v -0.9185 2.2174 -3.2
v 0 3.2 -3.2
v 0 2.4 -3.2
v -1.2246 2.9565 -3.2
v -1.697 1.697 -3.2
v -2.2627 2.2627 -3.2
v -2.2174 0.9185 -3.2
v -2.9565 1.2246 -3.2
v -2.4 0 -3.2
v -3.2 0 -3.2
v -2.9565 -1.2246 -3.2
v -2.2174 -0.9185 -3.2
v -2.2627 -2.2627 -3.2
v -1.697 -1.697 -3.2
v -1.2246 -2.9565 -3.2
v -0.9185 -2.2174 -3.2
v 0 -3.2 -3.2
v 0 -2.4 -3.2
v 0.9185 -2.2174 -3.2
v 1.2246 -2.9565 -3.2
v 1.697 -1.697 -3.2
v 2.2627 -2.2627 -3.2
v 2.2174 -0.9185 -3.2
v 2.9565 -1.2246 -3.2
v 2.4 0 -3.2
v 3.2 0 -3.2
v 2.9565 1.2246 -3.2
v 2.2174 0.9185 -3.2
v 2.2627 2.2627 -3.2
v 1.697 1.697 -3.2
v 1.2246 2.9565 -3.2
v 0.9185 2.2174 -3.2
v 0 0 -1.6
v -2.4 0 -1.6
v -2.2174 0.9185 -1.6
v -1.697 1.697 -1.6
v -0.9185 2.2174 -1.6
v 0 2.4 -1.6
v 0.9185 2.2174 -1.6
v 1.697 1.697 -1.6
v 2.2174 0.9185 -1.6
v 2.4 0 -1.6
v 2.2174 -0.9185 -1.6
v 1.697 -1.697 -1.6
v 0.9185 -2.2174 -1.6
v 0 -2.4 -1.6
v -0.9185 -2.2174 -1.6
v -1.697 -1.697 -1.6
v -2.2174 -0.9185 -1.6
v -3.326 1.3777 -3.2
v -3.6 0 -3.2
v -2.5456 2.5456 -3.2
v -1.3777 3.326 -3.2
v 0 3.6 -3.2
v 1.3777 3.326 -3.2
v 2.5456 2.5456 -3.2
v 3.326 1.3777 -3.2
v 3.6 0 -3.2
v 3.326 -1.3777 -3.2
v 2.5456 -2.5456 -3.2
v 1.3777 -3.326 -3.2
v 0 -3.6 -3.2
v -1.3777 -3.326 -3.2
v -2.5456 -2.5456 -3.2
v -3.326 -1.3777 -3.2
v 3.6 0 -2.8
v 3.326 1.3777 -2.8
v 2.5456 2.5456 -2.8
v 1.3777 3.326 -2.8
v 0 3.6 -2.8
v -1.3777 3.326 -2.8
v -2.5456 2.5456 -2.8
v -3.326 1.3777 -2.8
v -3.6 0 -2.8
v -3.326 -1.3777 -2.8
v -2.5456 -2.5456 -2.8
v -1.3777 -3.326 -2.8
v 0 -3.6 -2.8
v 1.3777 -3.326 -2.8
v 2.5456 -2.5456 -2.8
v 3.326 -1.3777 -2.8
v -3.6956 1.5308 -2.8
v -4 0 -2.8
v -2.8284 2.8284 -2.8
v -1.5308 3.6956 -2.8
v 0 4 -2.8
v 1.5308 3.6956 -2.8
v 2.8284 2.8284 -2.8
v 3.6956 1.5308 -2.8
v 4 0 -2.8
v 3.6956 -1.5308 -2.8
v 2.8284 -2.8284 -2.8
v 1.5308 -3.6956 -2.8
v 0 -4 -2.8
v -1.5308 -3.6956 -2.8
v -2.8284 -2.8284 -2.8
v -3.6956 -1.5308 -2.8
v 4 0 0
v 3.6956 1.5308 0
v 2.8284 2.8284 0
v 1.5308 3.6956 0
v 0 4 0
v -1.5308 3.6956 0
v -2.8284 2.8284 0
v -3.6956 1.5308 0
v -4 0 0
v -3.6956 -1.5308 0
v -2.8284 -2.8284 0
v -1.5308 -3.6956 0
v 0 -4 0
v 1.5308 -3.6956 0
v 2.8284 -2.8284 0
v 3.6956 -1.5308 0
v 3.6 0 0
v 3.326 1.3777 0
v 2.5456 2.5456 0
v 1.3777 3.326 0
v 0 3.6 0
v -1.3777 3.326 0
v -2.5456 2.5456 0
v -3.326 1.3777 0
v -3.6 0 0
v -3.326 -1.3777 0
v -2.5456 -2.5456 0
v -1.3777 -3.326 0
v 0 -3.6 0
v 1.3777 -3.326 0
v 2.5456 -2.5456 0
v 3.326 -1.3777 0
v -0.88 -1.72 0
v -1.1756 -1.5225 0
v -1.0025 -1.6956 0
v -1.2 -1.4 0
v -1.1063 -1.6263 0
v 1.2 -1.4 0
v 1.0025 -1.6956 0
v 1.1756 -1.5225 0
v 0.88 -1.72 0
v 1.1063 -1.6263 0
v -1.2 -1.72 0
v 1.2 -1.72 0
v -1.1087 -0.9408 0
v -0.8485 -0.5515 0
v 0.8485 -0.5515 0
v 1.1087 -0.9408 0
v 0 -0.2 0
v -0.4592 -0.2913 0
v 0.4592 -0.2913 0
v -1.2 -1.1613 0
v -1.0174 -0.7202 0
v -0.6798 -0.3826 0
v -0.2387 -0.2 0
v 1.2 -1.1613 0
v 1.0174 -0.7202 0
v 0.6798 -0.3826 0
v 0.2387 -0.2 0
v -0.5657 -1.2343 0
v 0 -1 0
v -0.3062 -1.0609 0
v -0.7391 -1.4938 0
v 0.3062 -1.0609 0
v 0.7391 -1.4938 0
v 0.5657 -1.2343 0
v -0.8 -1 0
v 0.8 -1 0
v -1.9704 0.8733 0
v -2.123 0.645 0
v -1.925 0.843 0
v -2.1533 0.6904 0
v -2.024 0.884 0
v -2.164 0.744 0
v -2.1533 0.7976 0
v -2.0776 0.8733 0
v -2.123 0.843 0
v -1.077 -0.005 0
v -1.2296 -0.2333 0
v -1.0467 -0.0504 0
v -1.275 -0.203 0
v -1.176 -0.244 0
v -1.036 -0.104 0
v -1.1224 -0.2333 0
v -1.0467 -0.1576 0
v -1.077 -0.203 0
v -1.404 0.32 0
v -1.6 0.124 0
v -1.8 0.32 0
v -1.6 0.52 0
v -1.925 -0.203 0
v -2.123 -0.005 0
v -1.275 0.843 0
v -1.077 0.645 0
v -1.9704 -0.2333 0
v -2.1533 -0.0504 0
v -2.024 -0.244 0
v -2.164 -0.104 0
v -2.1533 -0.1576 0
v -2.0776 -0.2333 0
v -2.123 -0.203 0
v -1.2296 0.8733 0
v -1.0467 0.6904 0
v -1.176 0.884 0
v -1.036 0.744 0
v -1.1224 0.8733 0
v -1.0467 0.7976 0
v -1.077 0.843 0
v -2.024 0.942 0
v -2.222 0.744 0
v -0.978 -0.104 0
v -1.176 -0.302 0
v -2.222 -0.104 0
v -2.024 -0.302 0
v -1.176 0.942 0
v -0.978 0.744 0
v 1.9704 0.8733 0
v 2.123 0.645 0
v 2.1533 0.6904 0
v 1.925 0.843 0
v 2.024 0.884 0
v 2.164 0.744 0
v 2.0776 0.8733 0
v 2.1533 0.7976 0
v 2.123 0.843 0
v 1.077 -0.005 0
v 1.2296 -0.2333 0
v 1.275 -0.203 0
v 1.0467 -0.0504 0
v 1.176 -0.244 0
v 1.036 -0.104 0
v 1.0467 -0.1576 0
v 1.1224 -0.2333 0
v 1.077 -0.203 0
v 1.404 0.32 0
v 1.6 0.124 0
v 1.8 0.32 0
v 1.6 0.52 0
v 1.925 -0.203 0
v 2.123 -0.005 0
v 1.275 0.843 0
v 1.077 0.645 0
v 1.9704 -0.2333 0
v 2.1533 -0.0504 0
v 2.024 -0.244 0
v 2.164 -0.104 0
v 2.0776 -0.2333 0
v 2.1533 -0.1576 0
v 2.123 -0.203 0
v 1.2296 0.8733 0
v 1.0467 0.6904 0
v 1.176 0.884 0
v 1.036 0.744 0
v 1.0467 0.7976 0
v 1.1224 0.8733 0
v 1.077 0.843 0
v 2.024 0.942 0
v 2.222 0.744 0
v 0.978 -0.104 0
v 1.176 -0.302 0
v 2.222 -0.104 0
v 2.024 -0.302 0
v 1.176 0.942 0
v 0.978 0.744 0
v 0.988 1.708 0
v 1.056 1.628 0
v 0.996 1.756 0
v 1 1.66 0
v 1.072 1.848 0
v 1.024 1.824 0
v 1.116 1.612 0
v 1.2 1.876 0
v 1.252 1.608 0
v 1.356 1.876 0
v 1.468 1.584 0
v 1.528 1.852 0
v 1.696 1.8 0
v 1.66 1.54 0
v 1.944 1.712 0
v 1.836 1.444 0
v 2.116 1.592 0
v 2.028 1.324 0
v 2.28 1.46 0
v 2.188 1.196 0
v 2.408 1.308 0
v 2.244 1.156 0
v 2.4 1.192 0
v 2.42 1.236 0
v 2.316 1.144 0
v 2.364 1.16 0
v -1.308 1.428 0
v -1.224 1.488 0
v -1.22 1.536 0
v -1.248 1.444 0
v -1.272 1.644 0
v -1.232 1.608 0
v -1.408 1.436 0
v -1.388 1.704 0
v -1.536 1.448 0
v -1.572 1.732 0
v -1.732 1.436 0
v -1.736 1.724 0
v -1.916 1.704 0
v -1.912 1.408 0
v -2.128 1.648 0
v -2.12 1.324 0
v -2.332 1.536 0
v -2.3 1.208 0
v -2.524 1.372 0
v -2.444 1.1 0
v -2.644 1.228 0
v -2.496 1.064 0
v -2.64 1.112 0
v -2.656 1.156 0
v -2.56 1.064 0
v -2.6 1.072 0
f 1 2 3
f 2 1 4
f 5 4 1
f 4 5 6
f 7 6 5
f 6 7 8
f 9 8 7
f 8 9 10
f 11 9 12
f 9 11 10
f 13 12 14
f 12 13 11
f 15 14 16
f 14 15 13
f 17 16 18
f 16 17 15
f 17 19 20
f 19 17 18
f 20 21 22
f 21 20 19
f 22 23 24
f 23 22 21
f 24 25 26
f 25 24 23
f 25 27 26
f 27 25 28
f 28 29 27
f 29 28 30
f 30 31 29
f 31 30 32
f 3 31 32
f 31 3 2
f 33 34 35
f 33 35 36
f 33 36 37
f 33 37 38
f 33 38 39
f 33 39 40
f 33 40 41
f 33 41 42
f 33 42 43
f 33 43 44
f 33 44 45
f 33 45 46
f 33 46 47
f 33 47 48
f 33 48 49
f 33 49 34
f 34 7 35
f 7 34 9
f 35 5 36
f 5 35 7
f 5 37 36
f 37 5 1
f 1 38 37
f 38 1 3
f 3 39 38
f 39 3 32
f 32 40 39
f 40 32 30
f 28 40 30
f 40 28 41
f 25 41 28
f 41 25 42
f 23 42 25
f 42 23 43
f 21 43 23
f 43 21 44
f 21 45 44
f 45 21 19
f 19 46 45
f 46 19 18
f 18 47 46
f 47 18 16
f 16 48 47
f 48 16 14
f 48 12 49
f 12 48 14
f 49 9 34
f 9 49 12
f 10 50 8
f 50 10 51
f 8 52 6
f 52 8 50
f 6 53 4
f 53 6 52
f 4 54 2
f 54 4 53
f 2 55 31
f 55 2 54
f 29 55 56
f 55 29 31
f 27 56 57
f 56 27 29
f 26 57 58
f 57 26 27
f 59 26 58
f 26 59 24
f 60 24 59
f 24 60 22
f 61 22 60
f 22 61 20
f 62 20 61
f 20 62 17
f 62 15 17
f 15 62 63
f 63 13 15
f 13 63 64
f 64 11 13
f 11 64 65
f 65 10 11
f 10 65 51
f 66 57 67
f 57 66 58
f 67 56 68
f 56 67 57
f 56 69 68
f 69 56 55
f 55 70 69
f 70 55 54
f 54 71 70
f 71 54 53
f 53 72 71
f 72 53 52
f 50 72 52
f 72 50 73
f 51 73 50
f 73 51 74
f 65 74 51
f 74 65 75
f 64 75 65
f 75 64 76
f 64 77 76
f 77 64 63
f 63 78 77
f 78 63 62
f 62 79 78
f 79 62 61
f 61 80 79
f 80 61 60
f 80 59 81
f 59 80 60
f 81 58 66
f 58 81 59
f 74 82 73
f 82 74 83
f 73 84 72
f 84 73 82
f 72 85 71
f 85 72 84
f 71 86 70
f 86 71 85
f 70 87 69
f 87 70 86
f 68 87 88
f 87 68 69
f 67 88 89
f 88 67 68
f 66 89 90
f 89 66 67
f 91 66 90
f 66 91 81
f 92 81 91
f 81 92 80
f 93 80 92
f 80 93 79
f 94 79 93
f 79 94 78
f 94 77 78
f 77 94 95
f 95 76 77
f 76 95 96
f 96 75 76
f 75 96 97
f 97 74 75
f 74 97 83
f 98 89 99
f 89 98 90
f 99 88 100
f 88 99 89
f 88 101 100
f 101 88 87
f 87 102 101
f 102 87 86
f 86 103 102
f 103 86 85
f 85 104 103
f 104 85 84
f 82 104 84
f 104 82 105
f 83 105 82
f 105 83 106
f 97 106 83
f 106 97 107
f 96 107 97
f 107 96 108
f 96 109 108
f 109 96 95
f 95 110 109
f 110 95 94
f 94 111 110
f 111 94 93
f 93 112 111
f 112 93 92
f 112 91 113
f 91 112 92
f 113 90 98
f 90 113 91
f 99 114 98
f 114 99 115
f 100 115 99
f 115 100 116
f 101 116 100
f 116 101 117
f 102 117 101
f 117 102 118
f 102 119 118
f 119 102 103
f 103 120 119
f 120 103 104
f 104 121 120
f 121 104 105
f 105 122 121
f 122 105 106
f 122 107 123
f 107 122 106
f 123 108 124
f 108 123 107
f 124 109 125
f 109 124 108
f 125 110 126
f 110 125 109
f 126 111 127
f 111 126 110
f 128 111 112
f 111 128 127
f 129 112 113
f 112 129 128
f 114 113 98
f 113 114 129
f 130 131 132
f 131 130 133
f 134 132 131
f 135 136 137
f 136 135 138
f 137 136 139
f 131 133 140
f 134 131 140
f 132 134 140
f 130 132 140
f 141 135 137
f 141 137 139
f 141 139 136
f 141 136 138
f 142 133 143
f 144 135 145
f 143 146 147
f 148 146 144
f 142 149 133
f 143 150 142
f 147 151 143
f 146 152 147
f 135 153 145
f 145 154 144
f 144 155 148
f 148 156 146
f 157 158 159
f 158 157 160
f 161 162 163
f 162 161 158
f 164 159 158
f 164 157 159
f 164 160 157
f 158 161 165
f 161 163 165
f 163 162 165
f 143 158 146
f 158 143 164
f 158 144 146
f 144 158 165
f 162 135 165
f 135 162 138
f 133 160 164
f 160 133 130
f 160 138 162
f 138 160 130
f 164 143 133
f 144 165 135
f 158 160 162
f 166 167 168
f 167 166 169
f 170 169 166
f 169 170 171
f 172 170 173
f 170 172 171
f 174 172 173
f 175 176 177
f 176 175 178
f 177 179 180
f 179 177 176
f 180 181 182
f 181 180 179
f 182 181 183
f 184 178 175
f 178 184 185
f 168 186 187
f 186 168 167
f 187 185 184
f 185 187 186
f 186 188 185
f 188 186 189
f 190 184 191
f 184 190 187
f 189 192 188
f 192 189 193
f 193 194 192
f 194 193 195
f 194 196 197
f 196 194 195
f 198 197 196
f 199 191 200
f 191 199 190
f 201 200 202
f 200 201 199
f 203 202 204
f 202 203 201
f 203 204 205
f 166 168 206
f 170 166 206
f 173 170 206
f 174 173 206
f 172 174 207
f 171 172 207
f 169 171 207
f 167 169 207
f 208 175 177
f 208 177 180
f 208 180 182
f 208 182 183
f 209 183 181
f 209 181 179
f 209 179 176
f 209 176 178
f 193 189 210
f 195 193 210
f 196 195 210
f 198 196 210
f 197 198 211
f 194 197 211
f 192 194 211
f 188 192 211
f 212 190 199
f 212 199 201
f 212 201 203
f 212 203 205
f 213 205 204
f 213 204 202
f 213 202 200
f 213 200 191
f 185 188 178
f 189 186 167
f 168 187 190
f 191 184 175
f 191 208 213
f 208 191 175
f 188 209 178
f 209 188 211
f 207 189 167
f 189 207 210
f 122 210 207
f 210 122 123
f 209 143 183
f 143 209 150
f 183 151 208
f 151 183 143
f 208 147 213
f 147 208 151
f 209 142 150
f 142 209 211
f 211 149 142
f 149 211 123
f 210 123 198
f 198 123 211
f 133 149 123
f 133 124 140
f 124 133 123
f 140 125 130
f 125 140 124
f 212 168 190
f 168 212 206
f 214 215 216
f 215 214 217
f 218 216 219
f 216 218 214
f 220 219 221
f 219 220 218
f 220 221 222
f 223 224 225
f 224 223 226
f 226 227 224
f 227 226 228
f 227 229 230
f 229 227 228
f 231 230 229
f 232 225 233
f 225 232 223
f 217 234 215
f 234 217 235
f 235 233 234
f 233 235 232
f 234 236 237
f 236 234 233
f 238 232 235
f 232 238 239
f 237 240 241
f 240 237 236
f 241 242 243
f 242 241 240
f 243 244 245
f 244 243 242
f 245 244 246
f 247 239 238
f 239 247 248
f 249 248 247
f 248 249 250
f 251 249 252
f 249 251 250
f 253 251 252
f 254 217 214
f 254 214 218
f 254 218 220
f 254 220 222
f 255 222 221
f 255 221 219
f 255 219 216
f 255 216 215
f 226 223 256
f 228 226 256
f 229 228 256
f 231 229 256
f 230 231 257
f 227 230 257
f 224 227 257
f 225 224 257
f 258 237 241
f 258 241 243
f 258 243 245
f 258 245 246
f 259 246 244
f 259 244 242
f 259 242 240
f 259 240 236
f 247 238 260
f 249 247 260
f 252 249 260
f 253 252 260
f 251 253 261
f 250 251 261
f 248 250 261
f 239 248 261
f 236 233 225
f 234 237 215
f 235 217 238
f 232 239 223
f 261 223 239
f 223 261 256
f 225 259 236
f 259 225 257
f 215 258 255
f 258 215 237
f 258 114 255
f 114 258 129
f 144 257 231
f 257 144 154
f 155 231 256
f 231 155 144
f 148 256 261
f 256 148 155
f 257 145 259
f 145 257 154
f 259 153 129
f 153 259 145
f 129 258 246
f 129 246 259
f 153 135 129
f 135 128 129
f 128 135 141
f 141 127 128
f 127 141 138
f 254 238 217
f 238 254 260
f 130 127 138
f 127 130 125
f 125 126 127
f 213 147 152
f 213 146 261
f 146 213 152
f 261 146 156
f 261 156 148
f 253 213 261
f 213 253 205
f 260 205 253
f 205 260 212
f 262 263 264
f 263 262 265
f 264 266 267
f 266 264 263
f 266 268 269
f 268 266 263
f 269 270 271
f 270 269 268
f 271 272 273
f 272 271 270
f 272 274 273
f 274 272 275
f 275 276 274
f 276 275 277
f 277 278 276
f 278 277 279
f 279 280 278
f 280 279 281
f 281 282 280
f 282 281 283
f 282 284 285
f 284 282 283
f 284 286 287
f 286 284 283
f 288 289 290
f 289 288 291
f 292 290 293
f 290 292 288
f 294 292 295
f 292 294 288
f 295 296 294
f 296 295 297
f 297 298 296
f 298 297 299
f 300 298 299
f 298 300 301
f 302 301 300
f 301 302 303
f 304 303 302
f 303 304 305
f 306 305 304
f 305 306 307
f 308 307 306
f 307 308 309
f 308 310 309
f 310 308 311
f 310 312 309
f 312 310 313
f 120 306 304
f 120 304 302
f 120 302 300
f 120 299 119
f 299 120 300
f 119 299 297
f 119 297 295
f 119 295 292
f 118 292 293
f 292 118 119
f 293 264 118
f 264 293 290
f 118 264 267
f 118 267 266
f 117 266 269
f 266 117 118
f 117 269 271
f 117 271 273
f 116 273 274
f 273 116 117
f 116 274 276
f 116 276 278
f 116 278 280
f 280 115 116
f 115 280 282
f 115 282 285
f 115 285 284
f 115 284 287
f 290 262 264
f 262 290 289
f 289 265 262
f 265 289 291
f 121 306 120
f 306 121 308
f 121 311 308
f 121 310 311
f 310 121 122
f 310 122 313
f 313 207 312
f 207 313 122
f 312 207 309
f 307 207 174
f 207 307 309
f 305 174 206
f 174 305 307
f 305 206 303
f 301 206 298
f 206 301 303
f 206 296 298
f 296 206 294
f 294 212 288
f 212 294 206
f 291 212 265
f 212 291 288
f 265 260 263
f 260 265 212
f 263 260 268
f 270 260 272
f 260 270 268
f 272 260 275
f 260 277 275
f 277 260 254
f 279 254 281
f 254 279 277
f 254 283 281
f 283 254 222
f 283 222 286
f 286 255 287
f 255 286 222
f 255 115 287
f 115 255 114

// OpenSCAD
use <../lib.scad>
use <../p/1-4chrd.scad>
use <../p/1-4ndis.scad>
use <../p/1-4tang.scad>
use <../p/1-8chrd.scad>
use <../p/2-4chrd.scad>
use <../p/2-4ndis.scad>
use <../p/3-16chrd.scad>
use <../p/3-16ndis.scad>
use <../p/4-4ering.scad>
use <s/98138s01.scad>
$fa=1; $fs=0.2;
function ldraw_lib__98138p1v(realsolid=false) = [
// 0 Tile  1 x  1 Round with Bright Light Yellow Emoji with "x" Eyes and Mouth with Top Semi Circle and Coral Tongue Pattern
// 0 Name: 98138p1v.dat
// 0 Author: Gerald Lasser [GeraldLasser]
// 0 !LDRAW_ORG Part UPDATE 2022-04
// 0 !LICENSE Licensed under CC BY 2.0 and CC BY 4.0 : see CAreadme.txt
// 
// 0 BFC CERTIFY CCW
  [0,"BFC","CERTIFY"],
  [0,"BFC","CCW"],
// 
// 0 !KEYWORDS Anguished, Creativity Box, Dots, Tired
// 
// 0 !HISTORY 2022-07-18 [PTadmin] Official Update 2022-04
// 
// 
// 1 16 0 0 0 1 0 0 0 1 0 0 0 1 s\98138s01.dat
  [1,16,0,0,0,1,0,0,0,1,0,0,0,1, ldraw_lib__s__98138s01(realsolid)],
// 1 226 0 0 0 9 0 0 0 1 0 0 0 9 4-4ering.dat
  [1,226,0,0,0,9,0,0,0,1,0,0,0,9, ldraw_lib__4_4ering(realsolid)],
// 
// 0 // Mouth
// 1 0 -2.2 0 -3.5 -.8 0 0 0 1 0 0 0 -.8 1-4chrd.dat
  [1,0,-2.2,0,-3.5,-.8,0,0,0,1,0,0,0,-.8, ldraw_lib__1_4chrd(realsolid)],
// 1 0 2.2 0 -3.5 .8 0 0 0 1 0 0 0 -.8 1-4chrd.dat
  [1,0,2.2,0,-3.5,.8,0,0,0,1,0,0,0,-.8, ldraw_lib__1_4chrd(realsolid)],
// 1 226 -2.2 0 -3.5 -.8 0 0 0 1 0 0 0 -.8 1-4ndis.dat
  [1,226,-2.2,0,-3.5,-.8,0,0,0,1,0,0,0,-.8, ldraw_lib__1_4ndis(realsolid)],
// 1 226 2.2 0 -3.5 .8 0 0 0 1 0 0 0 -.8 1-4ndis.dat
  [1,226,2.2,0,-3.5,.8,0,0,0,1,0,0,0,-.8, ldraw_lib__1_4ndis(realsolid)],
// 1 0 0 0 -3.5 -3 0 0 0 1 0 0 0 3 1-8chrd.dat
  [1,0,0,0,-3.5,-3,0,0,0,1,0,0,0,3, ldraw_lib__1_8chrd(realsolid)],
// 1 0 0 0 -3.5 3 0 0 0 1 0 0 0 3 1-8chrd.dat
  [1,0,0,0,-3.5,3,0,0,0,1,0,0,0,3, ldraw_lib__1_8chrd(realsolid)],
// 1 0 0 0 -3.5 0 0 -3 0 1 0 3 0 0 1-8chrd.dat
  [1,0,0,0,-3.5,0,0,-3,0,1,0,3,0,0, ldraw_lib__1_8chrd(realsolid)],
// 1 0 0 0 -3.5 0 0 3 0 1 0 3 0 0 1-8chrd.dat
  [1,0,0,0,-3.5,0,0,3,0,1,0,3,0,0, ldraw_lib__1_8chrd(realsolid)],
// 1 226 0 0 -3.5 -3 0 0 0 1 0 0 0 3 1-4tang.dat
  [1,226,0,0,-3.5,-3,0,0,0,1,0,0,0,3, ldraw_lib__1_4tang(realsolid)],
// 1 226 0 0 -3.5 3 0 0 0 1 0 0 0 3 1-4tang.dat
  [1,226,0,0,-3.5,3,0,0,0,1,0,0,0,3, ldraw_lib__1_4tang(realsolid)],
// 1 353 0 0 -4.5 0 0 -2 0 1 0 2 0 0 3-16chrd.dat
  [1,353,0,0,-4.5,0,0,-2,0,1,0,2,0,0, ldraw_lib__3_16chrd(realsolid)],
// 1 353 0 0 -4.5 0 0 2 0 1 0 2 0 0 3-16chrd.dat
  [1,353,0,0,-4.5,0,0,2,0,1,0,2,0,0, ldraw_lib__3_16chrd(realsolid)],
// 1 0 0 0 -4.5 0 0 -2 0 1 0 2 0 0 3-16ndis.dat
  [1,0,0,0,-4.5,0,0,-2,0,1,0,2,0,0, ldraw_lib__3_16ndis(realsolid)],
// 1 0 0 0 -4.5 0 0 2 0 1 0 2 0 0 3-16ndis.dat
  [1,0,0,0,-4.5,0,0,2,0,1,0,2,0,0, ldraw_lib__3_16ndis(realsolid)],
// 4 0 -2 0 -2.5 0 0 -2.5 0 0 -.5 -2.1213 0 -1.3787
  [4,0,-2,0,-2.5,0,0,-2.5,0,0,-.5,-2.1213,0,-1.3787],
// 4 0 2.1213 0 -1.3787 0 0 -.5 0 0 -2.5 2 0 -2.5
  [4,0,2.1213,0,-1.3787,0,0,-.5,0,0,-2.5,2,0,-2.5],
// 4 0 1.8478 0 -3.7346 2.2 0 -4.3 3 0 -3.5 2 0 -2.5
  [4,0,1.8478,0,-3.7346,2.2,0,-4.3,3,0,-3.5,2,0,-2.5],
// 4 0 -2 0 -2.5 -3 0 -3.5 -2.2 0 -4.3 -1.8478 0 -3.7346
  [4,0,-2,0,-2.5,-3,0,-3.5,-2.2,0,-4.3,-1.8478,0,-3.7346],
// 4 0 1.8478 0 -3.7346 -1.8478 0 -3.7346 -2.2 0 -4.3 2.2 0 -4.3
  [4,0,1.8478,0,-3.7346,-1.8478,0,-3.7346,-2.2,0,-4.3,2.2,0,-4.3],
// 3 0 -2 0 -2.5 -2.1213 0 -1.3787 -3 0 -3.5
  [3,0,-2,0,-2.5,-2.1213,0,-1.3787,-3,0,-3.5],
// 3 0 2.1213 0 -1.3787 2 0 -2.5 3 0 -3.5
  [3,0,2.1213,0,-1.3787,2,0,-2.5,3,0,-3.5],
// 3 353 0 0 -2.5 -1.8478 0 -3.7346 1.8478 0 -3.7346
  [3,353,0,0,-2.5,-1.8478,0,-3.7346,1.8478,0,-3.7346],
// 
// 0 // Eyes
// 1 0 -5.06 0 1.86 .24749 0 -.24749 0 1 0 .24749 0 .24749 2-4chrd.dat
  [1,0,-5.06,0,1.86,.24749,0,-.24749,0,1,0,.24749,0,.24749, ldraw_lib__2_4chrd(realsolid)],
// 1 0 -2.94 0 -.26 .24749 0 .24749 0 1 0 .24749 0 -.24749 2-4chrd.dat
  [1,0,-2.94,0,-.26,.24749,0,.24749,0,1,0,.24749,0,-.24749, ldraw_lib__2_4chrd(realsolid)],
// 4 0 -3.1875 0 -.5075 -2.6925 0 -.0125 -3.51 0 .8 -4 0 .31
  [4,0,-3.1875,0,-.5075,-2.6925,0,-.0125,-3.51,0,.8,-4,0,.31],
// 4 0 -4 0 1.3 -4.8125 0 2.1075 -5.3075 0 1.6125 -4.5 0 .8
  [4,0,-4,0,1.3,-4.8125,0,2.1075,-5.3075,0,1.6125,-4.5,0,.8],
// 4 0 -3.51 0 .8 -4 0 1.3 -4.5 0 .8 -4 0 .31
  [4,0,-3.51,0,.8,-4,0,1.3,-4.5,0,.8,-4,0,.31],
// 4 0 -4.8125 0 -.5075 -4 0 .31 -4.5 0 .8 -5.3075 0 -.0125
  [4,0,-4.8125,0,-.5075,-4,0,.31,-4.5,0,.8,-5.3075,0,-.0125],
// 4 0 -4 0 1.3 -3.51 0 .8 -2.6925 0 1.6125 -3.1875 0 2.1075
  [4,0,-4,0,1.3,-3.51,0,.8,-2.6925,0,1.6125,-3.1875,0,2.1075],
// 1 0 -5.06 0 -.26 -.24749 0 -.24749 0 1 0 .24749 0 -.24749 2-4chrd.dat
  [1,0,-5.06,0,-.26,-.24749,0,-.24749,0,1,0,.24749,0,-.24749, ldraw_lib__2_4chrd(realsolid)],
// 1 0 -2.94 0 1.86 -.24749 0 .24749 0 1 0 .24749 0 .24749 2-4chrd.dat
  [1,0,-2.94,0,1.86,-.24749,0,.24749,0,1,0,.24749,0,.24749, ldraw_lib__2_4chrd(realsolid)],
// 1 226 -5.06 0 1.86 .24749 0 -.24749 0 1 0 .24749 0 .24749 2-4ndis.dat
  [1,226,-5.06,0,1.86,.24749,0,-.24749,0,1,0,.24749,0,.24749, ldraw_lib__2_4ndis(realsolid)],
// 1 226 -2.94 0 -.26 .24749 0 .24749 0 1 0 .24749 0 -.24749 2-4ndis.dat
  [1,226,-2.94,0,-.26,.24749,0,.24749,0,1,0,.24749,0,-.24749, ldraw_lib__2_4ndis(realsolid)],
// 1 226 -5.06 0 -.26 -.24749 0 -.24749 0 1 0 .24749 0 -.24749 2-4ndis.dat
  [1,226,-5.06,0,-.26,-.24749,0,-.24749,0,1,0,.24749,0,-.24749, ldraw_lib__2_4ndis(realsolid)],
// 1 226 -2.94 0 1.86 -.24749 0 .24749 0 1 0 .24749 0 .24749 2-4ndis.dat
  [1,226,-2.94,0,1.86,-.24749,0,.24749,0,1,0,.24749,0,.24749, ldraw_lib__2_4ndis(realsolid)],
// 
// 3 226 -4 0 .31 -4.8125 0 -.5075 -3.1875 0 -.5075
  [3,226,-4,0,.31,-4.8125,0,-.5075,-3.1875,0,-.5075],
// 3 226 -5.3075 0 -.0125 -4.5 0 .8 -5.3075 0 1.6125
  [3,226,-5.3075,0,-.0125,-4.5,0,.8,-5.3075,0,1.6125],
// 3 226 -4.8125 0 2.1075 -4 0 1.3 -3.1875 0 2.1075
  [3,226,-4.8125,0,2.1075,-4,0,1.3,-3.1875,0,2.1075],
// 3 226 -2.6925 0 1.6125 -3.51 0 .8 -2.6925 0 -.0125
  [3,226,-2.6925,0,1.6125,-3.51,0,.8,-2.6925,0,-.0125],
// 4 226 -2.445 0 1.86 -2.6925 0 1.6125 -2.6925 0 -.0125 -2.445 0 -.26
  [4,226,-2.445,0,1.86,-2.6925,0,1.6125,-2.6925,0,-.0125,-2.445,0,-.26],
// 4 226 -5.06 0 -.755 -2.94 0 -.755 -3.1875 0 -.5075 -4.8125 0 -.5075
  [4,226,-5.06,0,-.755,-2.94,0,-.755,-3.1875,0,-.5075,-4.8125,0,-.5075],
// 4 226 -5.555 0 -.26 -5.3075 0 -.0125 -5.3075 0 1.6125 -5.555 0 1.86
  [4,226,-5.555,0,-.26,-5.3075,0,-.0125,-5.3075,0,1.6125,-5.555,0,1.86],
// 4 226 -5.555 0 -.26 -5.555 0 1.86 -9 0 0 -8.3151 0 -3.4443
  [4,226,-5.555,0,-.26,-5.555,0,1.86,-9,0,0,-8.3151,0,-3.4443],
// 4 226 -2.1213 0 -1.3787 -2.6925 0 -.5075 -2.94 0 -.755 -2.5434 0 -1.8005
  [4,226,-2.1213,0,-1.3787,-2.6925,0,-.5075,-2.94,0,-.755,-2.5434,0,-1.8005],
// 4 226 -2.6925 0 -.5075 -2.1213 0 -1.3787 -1.6995 0 -.9566 -2.445 0 -.26
  [4,226,-2.6925,0,-.5075,-2.1213,0,-1.3787,-1.6995,0,-.9566,-2.445,0,-.26],
// 4 226 -2.445 0 -.26 -1.6995 0 -.9566 -1.1481 0 -.7283 -2.445 0 1.86
  [4,226,-2.445,0,-.26,-1.6995,0,-.9566,-1.1481,0,-.7283,-2.445,0,1.86],
// 4 226 -2.7717 0 -2.3519 -2.5434 0 -1.8005 -2.94 0 -.755 -5.06 0 -.755
  [4,226,-2.7717,0,-2.3519,-2.5434,0,-1.8005,-2.94,0,-.755,-5.06,0,-.755],
// 4 226 -2.7717 0 -2.3519 -5.06 0 -.755 -8.3151 0 -3.4443 -3 0 -2.9033
  [4,226,-2.7717,0,-2.3519,-5.06,0,-.755,-8.3151,0,-3.4443,-3,0,-2.9033],
// 3 226 -5.555 0 -.26 -8.3151 0 -3.4443 -5.3075 0 -.5075
  [3,226,-5.555,0,-.26,-8.3151,0,-3.4443,-5.3075,0,-.5075],
// 3 226 -5.3075 0 -.5075 -8.3151 0 -3.4443 -5.06 0 -.755
  [3,226,-5.3075,0,-.5075,-8.3151,0,-3.4443,-5.06,0,-.755],
// 3 226 -3 0 -3.5 -3 0 -2.9033 -8.3151 0 -3.4443
  [3,226,-3,0,-3.5,-3,0,-2.9033,-8.3151,0,-3.4443],
// 4 226 -3 0 -3.5 -8.3151 0 -3.4443 -6.3639 0 -6.3639 -3 0 -4.3
  [4,226,-3,0,-3.5,-8.3151,0,-3.4443,-6.3639,0,-6.3639,-3,0,-4.3],
// 4 226 -3.4443 0 -8.3151 -2.2 0 -4.3 -3 0 -4.3 -6.3639 0 -6.3639
  [4,226,-3.4443,0,-8.3151,-2.2,0,-4.3,-3,0,-4.3,-6.3639,0,-6.3639],
// 4 226 -5.06 0 2.355 -4.8125 0 2.1075 -3.1875 0 2.1075 -2.94 0 2.355
  [4,226,-5.06,0,2.355,-4.8125,0,2.1075,-3.1875,0,2.1075,-2.94,0,2.355],
// 
// 1 0 5.06 0 1.86 -.24749 0 .24749 0 1 0 .24749 0 .24749 2-4chrd.dat
  [1,0,5.06,0,1.86,-.24749,0,.24749,0,1,0,.24749,0,.24749, ldraw_lib__2_4chrd(realsolid)],
// 1 0 2.94 0 -.26 -.24749 0 -.24749 0 1 0 .24749 0 -.24749 2-4chrd.dat
  [1,0,2.94,0,-.26,-.24749,0,-.24749,0,1,0,.24749,0,-.24749, ldraw_lib__2_4chrd(realsolid)],
// 4 0 3.51 0 .8 2.6925 0 -.0125 3.1875 0 -.5075 4 0 .31
  [4,0,3.51,0,.8,2.6925,0,-.0125,3.1875,0,-.5075,4,0,.31],
// 4 0 5.3075 0 1.6125 4.8125 0 2.1075 4 0 1.3 4.5 0 .8
  [4,0,5.3075,0,1.6125,4.8125,0,2.1075,4,0,1.3,4.5,0,.8],
// 4 0 4.5 0 .8 4 0 1.3 3.51 0 .8 4 0 .31
  [4,0,4.5,0,.8,4,0,1.3,3.51,0,.8,4,0,.31],
// 4 0 4.5 0 .8 4 0 .31 4.8125 0 -.5075 5.3075 0 -.0125
  [4,0,4.5,0,.8,4,0,.31,4.8125,0,-.5075,5.3075,0,-.0125],
// 4 0 2.6925 0 1.6125 3.51 0 .8 4 0 1.3 3.1875 0 2.1075
  [4,0,2.6925,0,1.6125,3.51,0,.8,4,0,1.3,3.1875,0,2.1075],
// 1 0 5.06 0 -.26 .24749 0 .24749 0 1 0 .24749 0 -.24749 2-4chrd.dat
  [1,0,5.06,0,-.26,.24749,0,.24749,0,1,0,.24749,0,-.24749, ldraw_lib__2_4chrd(realsolid)],
// 1 0 2.94 0 1.86 .24749 0 -.24749 0 1 0 .24749 0 .24749 2-4chrd.dat
  [1,0,2.94,0,1.86,.24749,0,-.24749,0,1,0,.24749,0,.24749, ldraw_lib__2_4chrd(realsolid)],
// 1 226 5.06 0 1.86 -.24749 0 .24749 0 1 0 .24749 0 .24749 2-4ndis.dat
  [1,226,5.06,0,1.86,-.24749,0,.24749,0,1,0,.24749,0,.24749, ldraw_lib__2_4ndis(realsolid)],
// 1 226 2.94 0 -.26 -.24749 0 -.24749 0 1 0 .24749 0 -.24749 2-4ndis.dat
  [1,226,2.94,0,-.26,-.24749,0,-.24749,0,1,0,.24749,0,-.24749, ldraw_lib__2_4ndis(realsolid)],
// 1 226 5.06 0 -.26 .24749 0 .24749 0 1 0 .24749 0 -.24749 2-4ndis.dat
  [1,226,5.06,0,-.26,.24749,0,.24749,0,1,0,.24749,0,-.24749, ldraw_lib__2_4ndis(realsolid)],
// 1 226 2.94 0 1.86 .24749 0 -.24749 0 1 0 .24749 0 .24749 2-4ndis.dat
  [1,226,2.94,0,1.86,.24749,0,-.24749,0,1,0,.24749,0,.24749, ldraw_lib__2_4ndis(realsolid)],
// 
// 3 226 4.8125 0 -.5075 4 0 .31 3.1875 0 -.5075
  [3,226,4.8125,0,-.5075,4,0,.31,3.1875,0,-.5075],
// 3 226 4.5 0 .8 5.3075 0 -.0125 5.3075 0 1.6125
  [3,226,4.5,0,.8,5.3075,0,-.0125,5.3075,0,1.6125],
// 3 226 4 0 1.3 4.8125 0 2.1075 3.1875 0 2.1075
  [3,226,4,0,1.3,4.8125,0,2.1075,3.1875,0,2.1075],
// 3 226 3.51 0 .8 2.6925 0 1.6125 2.6925 0 -.0125
  [3,226,3.51,0,.8,2.6925,0,1.6125,2.6925,0,-.0125],
// 4 226 2.6925 0 -.0125 2.6925 0 1.6125 2.445 0 1.86 2.445 0 -.26
  [4,226,2.6925,0,-.0125,2.6925,0,1.6125,2.445,0,1.86,2.445,0,-.26],
// 4 226 3.1875 0 -.5075 2.94 0 -.755 5.06 0 -.755 4.8125 0 -.5075
  [4,226,3.1875,0,-.5075,2.94,0,-.755,5.06,0,-.755,4.8125,0,-.5075],
// 4 226 5.3075 0 1.6125 5.3075 0 -.0125 5.555 0 -.26 5.555 0 1.86
  [4,226,5.3075,0,1.6125,5.3075,0,-.0125,5.555,0,-.26,5.555,0,1.86],
// 4 226 9 0 0 5.555 0 1.86 5.555 0 -.26 8.3151 0 -3.4443
  [4,226,9,0,0,5.555,0,1.86,5.555,0,-.26,8.3151,0,-3.4443],
// 4 226 2.94 0 -.755 2.6925 0 -.5075 2.1213 0 -1.3787 2.5434 0 -1.8005
  [4,226,2.94,0,-.755,2.6925,0,-.5075,2.1213,0,-1.3787,2.5434,0,-1.8005],
// 4 226 1.6995 0 -.9566 2.1213 0 -1.3787 2.6925 0 -.5075 2.445 0 -.26
  [4,226,1.6995,0,-.9566,2.1213,0,-1.3787,2.6925,0,-.5075,2.445,0,-.26],
// 4 226 1.1481 0 -.7283 1.6995 0 -.9566 2.445 0 -.26 2.445 0 1.86
  [4,226,1.1481,0,-.7283,1.6995,0,-.9566,2.445,0,-.26,2.445,0,1.86],
// 4 226 2.94 0 -.755 2.5434 0 -1.8005 2.7717 0 -2.3519 5.06 0 -.755
  [4,226,2.94,0,-.755,2.5434,0,-1.8005,2.7717,0,-2.3519,5.06,0,-.755],
// 4 226 8.3151 0 -3.4443 5.06 0 -.755 2.7717 0 -2.3519 3 0 -2.9033
  [4,226,8.3151,0,-3.4443,5.06,0,-.755,2.7717,0,-2.3519,3,0,-2.9033],
// 3 226 8.3151 0 -3.4443 5.555 0 -.26 5.3075 0 -.5075
  [3,226,8.3151,0,-3.4443,5.555,0,-.26,5.3075,0,-.5075],
// 3 226 8.3151 0 -3.4443 5.3075 0 -.5075 5.06 0 -.755
  [3,226,8.3151,0,-3.4443,5.3075,0,-.5075,5.06,0,-.755],
// 3 226 3 0 -2.9033 3 0 -3.5 8.3151 0 -3.4443
  [3,226,3,0,-2.9033,3,0,-3.5,8.3151,0,-3.4443],
// 4 226 6.3639 0 -6.3639 8.3151 0 -3.4443 3 0 -3.5 3 0 -4.3
  [4,226,6.3639,0,-6.3639,8.3151,0,-3.4443,3,0,-3.5,3,0,-4.3],
// 4 226 3 0 -4.3 2.2 0 -4.3 3.4443 0 -8.3151 6.3639 0 -6.3639
  [4,226,3,0,-4.3,2.2,0,-4.3,3.4443,0,-8.3151,6.3639,0,-6.3639],
// 4 226 3.1875 0 2.1075 4.8125 0 2.1075 5.06 0 2.355 2.94 0 2.355
  [4,226,3.1875,0,2.1075,4.8125,0,2.1075,5.06,0,2.355,2.94,0,2.355],
// 
// 4 226 3.4443 0 -8.3151 2.2 0 -4.3 -2.2 0 -4.3 -3.4443 0 -8.3151
  [4,226,3.4443,0,-8.3151,2.2,0,-4.3,-2.2,0,-4.3,-3.4443,0,-8.3151],
// 3 226 -3.4443 0 -8.3151 0 0 -9 3.4443 0 -8.3151
  [3,226,-3.4443,0,-8.3151,0,0,-9,3.4443,0,-8.3151],
// 3 226 -2.445 0 1.86 -1.1481 0 -.7283 -.5967 0 -.5
  [3,226,-2.445,0,1.86,-1.1481,0,-.7283,-.5967,0,-.5],
// 4 226 2.445 0 1.86 -2.445 0 1.86 -.5967 0 -.5 0 0 -.5
  [4,226,2.445,0,1.86,-2.445,0,1.86,-.5967,0,-.5,0,0,-.5],
// 3 226 2.445 0 1.86 0 0 -.5 .5967 0 -.5
  [3,226,2.445,0,1.86,0,0,-.5,.5967,0,-.5],
// 3 226 2.445 0 1.86 .5967 0 -.5 1.1481 0 -.7283
  [3,226,2.445,0,1.86,.5967,0,-.5,1.1481,0,-.7283],
// 4 226 -2.6925 0 2.1075 -2.445 0 1.86 2.445 0 1.86 2.6925 0 2.1075
  [4,226,-2.6925,0,2.1075,-2.445,0,1.86,2.445,0,1.86,2.6925,0,2.1075],
// 4 226 -2.6925 0 2.1075 2.6925 0 2.1075 2.94 0 2.355 -2.94 0 2.355
  [4,226,-2.6925,0,2.1075,2.6925,0,2.1075,2.94,0,2.355,-2.94,0,2.355],
// 
// 0 // Brows
// 4 0 2.47 0 4.27 2.5 0 4.15 2.64 0 4.07 2.49 0 4.39
  [4,0,2.47,0,4.27,2.5,0,4.15,2.64,0,4.07,2.49,0,4.39],
// 4 0 2.56 0 4.56 2.49 0 4.39 2.64 0 4.07 2.68 0 4.62
  [4,0,2.56,0,4.56,2.49,0,4.39,2.64,0,4.07,2.68,0,4.62],
// 4 0 2.68 0 4.62 2.64 0 4.07 2.79 0 4.03 3 0 4.69
  [4,0,2.68,0,4.62,2.64,0,4.07,2.79,0,4.03,3,0,4.69],
// 4 0 3.39 0 4.69 3 0 4.69 2.79 0 4.03 3.13 0 4.02
  [4,0,3.39,0,4.69,3,0,4.69,2.79,0,4.03,3.13,0,4.02],
// 4 0 3.82 0 4.63 3.39 0 4.69 3.13 0 4.02 3.67 0 3.96
  [4,0,3.82,0,4.63,3.39,0,4.69,3.13,0,4.02,3.67,0,3.96],
// 4 0 4.24 0 4.5 3.82 0 4.63 3.67 0 3.96 4.15 0 3.85
  [4,0,4.24,0,4.5,3.82,0,4.63,3.67,0,3.96,4.15,0,3.85],
// 4 0 4.86 0 4.28 4.24 0 4.5 4.15 0 3.85 4.59 0 3.61
  [4,0,4.86,0,4.28,4.24,0,4.5,4.15,0,3.85,4.59,0,3.61],
// 4 0 5.29 0 3.98 4.86 0 4.28 4.59 0 3.61 5.07 0 3.31
  [4,0,5.29,0,3.98,4.86,0,4.28,4.59,0,3.61,5.07,0,3.31],
// 4 0 5.7 0 3.65 5.29 0 3.98 5.07 0 3.31 5.47 0 2.99
  [4,0,5.7,0,3.65,5.29,0,3.98,5.07,0,3.31,5.47,0,2.99],
// 4 0 6.02 0 3.27 5.7 0 3.65 5.47 0 2.99 5.61 0 2.89
  [4,0,6.02,0,3.27,5.7,0,3.65,5.47,0,2.99,5.61,0,2.89],
// 4 0 6.05 0 3.09 6.02 0 3.27 5.61 0 2.89 6 0 2.98
  [4,0,6.05,0,3.09,6.02,0,3.27,5.61,0,2.89,6,0,2.98],
// 4 0 6 0 2.98 5.61 0 2.89 5.79 0 2.86 5.91 0 2.9
  [4,0,6,0,2.98,5.61,0,2.89,5.79,0,2.86,5.91,0,2.9],
// 4 0 -3.27 0 3.57 -3.12 0 3.61 -3.06 0 3.72 -3.05 0 3.84
  [4,0,-3.27,0,3.57,-3.12,0,3.61,-3.06,0,3.72,-3.05,0,3.84],
// 4 0 -3.27 0 3.57 -3.05 0 3.84 -3.08 0 4.02 -3.18 0 4.11
  [4,0,-3.27,0,3.57,-3.05,0,3.84,-3.08,0,4.02,-3.18,0,4.11],
// 4 0 -3.52 0 3.59 -3.27 0 3.57 -3.18 0 4.11 -3.47 0 4.26
  [4,0,-3.52,0,3.59,-3.27,0,3.57,-3.18,0,4.11,-3.47,0,4.26],
// 4 0 -3.52 0 3.59 -3.47 0 4.26 -3.93 0 4.33 -3.84 0 3.62
  [4,0,-3.52,0,3.59,-3.47,0,4.26,-3.93,0,4.33,-3.84,0,3.62],
// 4 0 -3.84 0 3.62 -3.93 0 4.33 -4.34 0 4.31 -4.33 0 3.59
  [4,0,-3.84,0,3.62,-3.93,0,4.33,-4.34,0,4.31,-4.33,0,3.59],
// 4 0 -4.33 0 3.59 -4.34 0 4.31 -4.79 0 4.26 -4.78 0 3.52
  [4,0,-4.33,0,3.59,-4.34,0,4.31,-4.79,0,4.26,-4.78,0,3.52],
// 4 0 -4.78 0 3.52 -4.79 0 4.26 -5.32 0 4.12 -5.3 0 3.31
  [4,0,-4.78,0,3.52,-4.79,0,4.26,-5.32,0,4.12,-5.3,0,3.31],
// 4 0 -5.3 0 3.31 -5.32 0 4.12 -5.83 0 3.84 -5.75 0 3.02
  [4,0,-5.3,0,3.31,-5.32,0,4.12,-5.83,0,3.84,-5.75,0,3.02],
// 4 0 -5.75 0 3.02 -5.83 0 3.84 -6.31 0 3.43 -6.11 0 2.75
  [4,0,-5.75,0,3.02,-5.83,0,3.84,-6.31,0,3.43,-6.11,0,2.75],
// 4 0 -6.11 0 2.75 -6.31 0 3.43 -6.61 0 3.07 -6.24 0 2.66
  [4,0,-6.11,0,2.75,-6.31,0,3.43,-6.61,0,3.07,-6.24,0,2.66],
// 4 0 -6.24 0 2.66 -6.61 0 3.07 -6.64 0 2.89 -6.6 0 2.78
  [4,0,-6.24,0,2.66,-6.61,0,3.07,-6.64,0,2.89,-6.6,0,2.78],
// 4 0 -6.4 0 2.66 -6.24 0 2.66 -6.6 0 2.78 -6.5 0 2.68
  [4,0,-6.4,0,2.66,-6.24,0,2.66,-6.6,0,2.78,-6.5,0,2.68],
// 3 226 -6.3639 0 6.3639 -6.31 0 3.43 -5.83 0 3.84
  [3,226,-6.3639,0,6.3639,-6.31,0,3.43,-5.83,0,3.84],
// 3 226 -6.3639 0 6.3639 -5.83 0 3.84 -5.32 0 4.12
  [3,226,-6.3639,0,6.3639,-5.83,0,3.84,-5.32,0,4.12],
// 3 226 -6.3639 0 6.3639 -5.32 0 4.12 -4.79 0 4.26
  [3,226,-6.3639,0,6.3639,-5.32,0,4.12,-4.79,0,4.26],
// 4 226 -6.3639 0 6.3639 -4.79 0 4.26 -4.34 0 4.31 -3.4443 0 8.3151
  [4,226,-6.3639,0,6.3639,-4.79,0,4.26,-4.34,0,4.31,-3.4443,0,8.3151],
// 3 226 -3.4443 0 8.3151 -4.34 0 4.31 -3.93 0 4.33
  [3,226,-3.4443,0,8.3151,-4.34,0,4.31,-3.93,0,4.33],
// 3 226 -3.4443 0 8.3151 -3.93 0 4.33 -3.47 0 4.26
  [3,226,-3.4443,0,8.3151,-3.93,0,4.33,-3.47,0,4.26],
// 3 226 -3.4443 0 8.3151 -3.47 0 4.26 -3.18 0 4.11
  [3,226,-3.4443,0,8.3151,-3.47,0,4.26,-3.18,0,4.11],
// 4 226 -3.4443 0 8.3151 -3.18 0 4.11 -3.08 0 4.02 0 0 9
  [4,226,-3.4443,0,8.3151,-3.18,0,4.11,-3.08,0,4.02,0,0,9],
// 4 226 0 0 9 -3.08 0 4.02 -3.05 0 3.84 2.49 0 4.39
  [4,226,0,0,9,-3.08,0,4.02,-3.05,0,3.84,2.49,0,4.39],
// 3 226 0 0 9 2.49 0 4.39 2.56 0 4.56
  [3,226,0,0,9,2.49,0,4.39,2.56,0,4.56],
// 3 226 0 0 9 2.56 0 4.56 2.68 0 4.62
  [3,226,0,0,9,2.56,0,4.56,2.68,0,4.62],
// 4 226 0 0 9 2.68 0 4.62 3 0 4.69 3.4443 0 8.3151
  [4,226,0,0,9,2.68,0,4.62,3,0,4.69,3.4443,0,8.3151],
// 3 226 3.4443 0 8.3151 3 0 4.69 3.39 0 4.69
  [3,226,3.4443,0,8.3151,3,0,4.69,3.39,0,4.69],
// 3 226 3.4443 0 8.3151 3.39 0 4.69 3.82 0 4.63
  [3,226,3.4443,0,8.3151,3.39,0,4.69,3.82,0,4.63],
// 4 226 3.4443 0 8.3151 3.82 0 4.63 4.24 0 4.5 6.3639 0 6.3639
  [4,226,3.4443,0,8.3151,3.82,0,4.63,4.24,0,4.5,6.3639,0,6.3639],
// 3 226 6.3639 0 6.3639 4.24 0 4.5 4.86 0 4.28
  [3,226,6.3639,0,6.3639,4.24,0,4.5,4.86,0,4.28],
// 3 226 6.3639 0 6.3639 4.86 0 4.28 5.29 0 3.98
  [3,226,6.3639,0,6.3639,4.86,0,4.28,5.29,0,3.98],
// 3 226 6.3639 0 6.3639 5.29 0 3.98 5.7 0 3.65
  [3,226,6.3639,0,6.3639,5.29,0,3.98,5.7,0,3.65],
// 4 226 6.3639 0 6.3639 5.7 0 3.65 6.02 0 3.27 8.3151 0 3.4443
  [4,226,6.3639,0,6.3639,5.7,0,3.65,6.02,0,3.27,8.3151,0,3.4443],
// 3 226 8.3151 0 3.4443 6.02 0 3.27 6.05 0 3.09
  [3,226,8.3151,0,3.4443,6.02,0,3.27,6.05,0,3.09],
// 3 226 8.3151 0 3.4443 6.05 0 3.09 6 0 2.98
  [3,226,8.3151,0,3.4443,6.05,0,3.09,6,0,2.98],
// 3 226 8.3151 0 3.4443 6 0 2.98 5.91 0 2.9
  [3,226,8.3151,0,3.4443,6,0,2.98,5.91,0,2.9],
// 4 226 -3.05 0 3.84 -3.06 0 3.72 2.47 0 4.27 2.49 0 4.39
  [4,226,-3.05,0,3.84,-3.06,0,3.72,2.47,0,4.27,2.49,0,4.39],
// 4 226 -3.06 0 3.72 -3.12 0 3.61 2.5 0 4.15 2.47 0 4.27
  [4,226,-3.06,0,3.72,-3.12,0,3.61,2.5,0,4.15,2.47,0,4.27],
// 4 226 -6.61 0 3.07 -6.31 0 3.43 -6.3639 0 6.3639 -8.3151 0 3.4443
  [4,226,-6.61,0,3.07,-6.31,0,3.43,-6.3639,0,6.3639,-8.3151,0,3.4443],
// 3 226 -8.3151 0 3.4443 -6.64 0 2.89 -6.61 0 3.07
  [3,226,-8.3151,0,3.4443,-6.64,0,2.89,-6.61,0,3.07],
// 4 226 -9 0 0 -6.6 0 2.78 -6.64 0 2.89 -8.3151 0 3.4443
  [4,226,-9,0,0,-6.6,0,2.78,-6.64,0,2.89,-8.3151,0,3.4443],
// 
// 3 226 -6.6 0 2.78 -9 0 0 -6.5 0 2.68
  [3,226,-6.6,0,2.78,-9,0,0,-6.5,0,2.68],
// 4 226 -6.5 0 2.68 -9 0 0 -5.555 0 1.86 -6.4 0 2.66
  [4,226,-6.5,0,2.68,-9,0,0,-5.555,0,1.86,-6.4,0,2.66],
// 3 226 -6.4 0 2.66 -5.555 0 1.86 -6.24 0 2.66
  [3,226,-6.4,0,2.66,-5.555,0,1.86,-6.24,0,2.66],
// 4 226 -6.24 0 2.66 -5.555 0 1.86 -5.3075 0 2.1075 -6.11 0 2.75
  [4,226,-6.24,0,2.66,-5.555,0,1.86,-5.3075,0,2.1075,-6.11,0,2.75],
// 4 226 -6.11 0 2.75 -5.3075 0 2.1075 -5.06 0 2.355 -5.75 0 3.02
  [4,226,-6.11,0,2.75,-5.3075,0,2.1075,-5.06,0,2.355,-5.75,0,3.02],
// 3 226 -5.75 0 3.02 -5.06 0 2.355 -5.3 0 3.31
  [3,226,-5.75,0,3.02,-5.06,0,2.355,-5.3,0,3.31],
// 4 226 -5.3 0 3.31 -5.06 0 2.355 -4.33 0 3.59 -4.78 0 3.52
  [4,226,-5.3,0,3.31,-5.06,0,2.355,-4.33,0,3.59,-4.78,0,3.52],
// 4 226 -4.33 0 3.59 -5.06 0 2.355 -3.52 0 3.59 -3.84 0 3.62
  [4,226,-4.33,0,3.59,-5.06,0,2.355,-3.52,0,3.59,-3.84,0,3.62],
// 4 226 -5.06 0 2.355 -2.94 0 2.355 -3.27 0 3.57 -3.52 0 3.59
  [4,226,-5.06,0,2.355,-2.94,0,2.355,-3.27,0,3.57,-3.52,0,3.59],
// 4 226 -3.27 0 3.57 -2.94 0 2.355 2.5 0 4.15 -3.12 0 3.61
  [4,226,-3.27,0,3.57,-2.94,0,2.355,2.5,0,4.15,-3.12,0,3.61],
// 4 226 2.64 0 4.07 2.5 0 4.15 -2.94 0 2.355 2.94 0 2.355
  [4,226,2.64,0,4.07,2.5,0,4.15,-2.94,0,2.355,2.94,0,2.355],
// 3 226 2.64 0 4.07 2.94 0 2.355 2.79 0 4.03
  [3,226,2.64,0,4.07,2.94,0,2.355,2.79,0,4.03],
// 4 226 3.67 0 3.96 3.13 0 4.02 2.79 0 4.03 2.94 0 2.355
  [4,226,3.67,0,3.96,3.13,0,4.02,2.79,0,4.03,2.94,0,2.355],
// 3 226 3.67 0 3.96 2.94 0 2.355 4.15 0 3.85
  [3,226,3.67,0,3.96,2.94,0,2.355,4.15,0,3.85],
// 4 226 4.15 0 3.85 2.94 0 2.355 5.06 0 2.355 4.59 0 3.61
  [4,226,4.15,0,3.85,2.94,0,2.355,5.06,0,2.355,4.59,0,3.61],
// 4 226 4.59 0 3.61 5.06 0 2.355 5.47 0 2.99 5.07 0 3.31
  [4,226,4.59,0,3.61,5.06,0,2.355,5.47,0,2.99,5.07,0,3.31],
// 4 226 5.47 0 2.99 5.06 0 2.355 5.3075 0 2.1075 5.61 0 2.89
  [4,226,5.47,0,2.99,5.06,0,2.355,5.3075,0,2.1075,5.61,0,2.89],
// 3 226 5.61 0 2.89 5.3075 0 2.1075 5.79 0 2.86
  [3,226,5.61,0,2.89,5.3075,0,2.1075,5.79,0,2.86],
// 4 226 5.3075 0 2.1075 5.555 0 1.86 5.91 0 2.9 5.79 0 2.86
  [4,226,5.3075,0,2.1075,5.555,0,1.86,5.91,0,2.9,5.79,0,2.86],
// 4 226 5.555 0 1.86 9 0 0 8.3151 0 3.4443 5.91 0 2.9
  [4,226,5.555,0,1.86,9,0,0,8.3151,0,3.4443,5.91,0,2.9],
];
module ldraw_lib__98138p1v(step=0, col=false, unit=2/5, alt=false, line=0.2, solid=!$preview)
    makepoly(ldraw_lib__98138p1v(solid), step=step, col=col, unit=unit, alt=alt, line=line, solid=solid);
ldraw_lib__98138p1v(line=0.2);
